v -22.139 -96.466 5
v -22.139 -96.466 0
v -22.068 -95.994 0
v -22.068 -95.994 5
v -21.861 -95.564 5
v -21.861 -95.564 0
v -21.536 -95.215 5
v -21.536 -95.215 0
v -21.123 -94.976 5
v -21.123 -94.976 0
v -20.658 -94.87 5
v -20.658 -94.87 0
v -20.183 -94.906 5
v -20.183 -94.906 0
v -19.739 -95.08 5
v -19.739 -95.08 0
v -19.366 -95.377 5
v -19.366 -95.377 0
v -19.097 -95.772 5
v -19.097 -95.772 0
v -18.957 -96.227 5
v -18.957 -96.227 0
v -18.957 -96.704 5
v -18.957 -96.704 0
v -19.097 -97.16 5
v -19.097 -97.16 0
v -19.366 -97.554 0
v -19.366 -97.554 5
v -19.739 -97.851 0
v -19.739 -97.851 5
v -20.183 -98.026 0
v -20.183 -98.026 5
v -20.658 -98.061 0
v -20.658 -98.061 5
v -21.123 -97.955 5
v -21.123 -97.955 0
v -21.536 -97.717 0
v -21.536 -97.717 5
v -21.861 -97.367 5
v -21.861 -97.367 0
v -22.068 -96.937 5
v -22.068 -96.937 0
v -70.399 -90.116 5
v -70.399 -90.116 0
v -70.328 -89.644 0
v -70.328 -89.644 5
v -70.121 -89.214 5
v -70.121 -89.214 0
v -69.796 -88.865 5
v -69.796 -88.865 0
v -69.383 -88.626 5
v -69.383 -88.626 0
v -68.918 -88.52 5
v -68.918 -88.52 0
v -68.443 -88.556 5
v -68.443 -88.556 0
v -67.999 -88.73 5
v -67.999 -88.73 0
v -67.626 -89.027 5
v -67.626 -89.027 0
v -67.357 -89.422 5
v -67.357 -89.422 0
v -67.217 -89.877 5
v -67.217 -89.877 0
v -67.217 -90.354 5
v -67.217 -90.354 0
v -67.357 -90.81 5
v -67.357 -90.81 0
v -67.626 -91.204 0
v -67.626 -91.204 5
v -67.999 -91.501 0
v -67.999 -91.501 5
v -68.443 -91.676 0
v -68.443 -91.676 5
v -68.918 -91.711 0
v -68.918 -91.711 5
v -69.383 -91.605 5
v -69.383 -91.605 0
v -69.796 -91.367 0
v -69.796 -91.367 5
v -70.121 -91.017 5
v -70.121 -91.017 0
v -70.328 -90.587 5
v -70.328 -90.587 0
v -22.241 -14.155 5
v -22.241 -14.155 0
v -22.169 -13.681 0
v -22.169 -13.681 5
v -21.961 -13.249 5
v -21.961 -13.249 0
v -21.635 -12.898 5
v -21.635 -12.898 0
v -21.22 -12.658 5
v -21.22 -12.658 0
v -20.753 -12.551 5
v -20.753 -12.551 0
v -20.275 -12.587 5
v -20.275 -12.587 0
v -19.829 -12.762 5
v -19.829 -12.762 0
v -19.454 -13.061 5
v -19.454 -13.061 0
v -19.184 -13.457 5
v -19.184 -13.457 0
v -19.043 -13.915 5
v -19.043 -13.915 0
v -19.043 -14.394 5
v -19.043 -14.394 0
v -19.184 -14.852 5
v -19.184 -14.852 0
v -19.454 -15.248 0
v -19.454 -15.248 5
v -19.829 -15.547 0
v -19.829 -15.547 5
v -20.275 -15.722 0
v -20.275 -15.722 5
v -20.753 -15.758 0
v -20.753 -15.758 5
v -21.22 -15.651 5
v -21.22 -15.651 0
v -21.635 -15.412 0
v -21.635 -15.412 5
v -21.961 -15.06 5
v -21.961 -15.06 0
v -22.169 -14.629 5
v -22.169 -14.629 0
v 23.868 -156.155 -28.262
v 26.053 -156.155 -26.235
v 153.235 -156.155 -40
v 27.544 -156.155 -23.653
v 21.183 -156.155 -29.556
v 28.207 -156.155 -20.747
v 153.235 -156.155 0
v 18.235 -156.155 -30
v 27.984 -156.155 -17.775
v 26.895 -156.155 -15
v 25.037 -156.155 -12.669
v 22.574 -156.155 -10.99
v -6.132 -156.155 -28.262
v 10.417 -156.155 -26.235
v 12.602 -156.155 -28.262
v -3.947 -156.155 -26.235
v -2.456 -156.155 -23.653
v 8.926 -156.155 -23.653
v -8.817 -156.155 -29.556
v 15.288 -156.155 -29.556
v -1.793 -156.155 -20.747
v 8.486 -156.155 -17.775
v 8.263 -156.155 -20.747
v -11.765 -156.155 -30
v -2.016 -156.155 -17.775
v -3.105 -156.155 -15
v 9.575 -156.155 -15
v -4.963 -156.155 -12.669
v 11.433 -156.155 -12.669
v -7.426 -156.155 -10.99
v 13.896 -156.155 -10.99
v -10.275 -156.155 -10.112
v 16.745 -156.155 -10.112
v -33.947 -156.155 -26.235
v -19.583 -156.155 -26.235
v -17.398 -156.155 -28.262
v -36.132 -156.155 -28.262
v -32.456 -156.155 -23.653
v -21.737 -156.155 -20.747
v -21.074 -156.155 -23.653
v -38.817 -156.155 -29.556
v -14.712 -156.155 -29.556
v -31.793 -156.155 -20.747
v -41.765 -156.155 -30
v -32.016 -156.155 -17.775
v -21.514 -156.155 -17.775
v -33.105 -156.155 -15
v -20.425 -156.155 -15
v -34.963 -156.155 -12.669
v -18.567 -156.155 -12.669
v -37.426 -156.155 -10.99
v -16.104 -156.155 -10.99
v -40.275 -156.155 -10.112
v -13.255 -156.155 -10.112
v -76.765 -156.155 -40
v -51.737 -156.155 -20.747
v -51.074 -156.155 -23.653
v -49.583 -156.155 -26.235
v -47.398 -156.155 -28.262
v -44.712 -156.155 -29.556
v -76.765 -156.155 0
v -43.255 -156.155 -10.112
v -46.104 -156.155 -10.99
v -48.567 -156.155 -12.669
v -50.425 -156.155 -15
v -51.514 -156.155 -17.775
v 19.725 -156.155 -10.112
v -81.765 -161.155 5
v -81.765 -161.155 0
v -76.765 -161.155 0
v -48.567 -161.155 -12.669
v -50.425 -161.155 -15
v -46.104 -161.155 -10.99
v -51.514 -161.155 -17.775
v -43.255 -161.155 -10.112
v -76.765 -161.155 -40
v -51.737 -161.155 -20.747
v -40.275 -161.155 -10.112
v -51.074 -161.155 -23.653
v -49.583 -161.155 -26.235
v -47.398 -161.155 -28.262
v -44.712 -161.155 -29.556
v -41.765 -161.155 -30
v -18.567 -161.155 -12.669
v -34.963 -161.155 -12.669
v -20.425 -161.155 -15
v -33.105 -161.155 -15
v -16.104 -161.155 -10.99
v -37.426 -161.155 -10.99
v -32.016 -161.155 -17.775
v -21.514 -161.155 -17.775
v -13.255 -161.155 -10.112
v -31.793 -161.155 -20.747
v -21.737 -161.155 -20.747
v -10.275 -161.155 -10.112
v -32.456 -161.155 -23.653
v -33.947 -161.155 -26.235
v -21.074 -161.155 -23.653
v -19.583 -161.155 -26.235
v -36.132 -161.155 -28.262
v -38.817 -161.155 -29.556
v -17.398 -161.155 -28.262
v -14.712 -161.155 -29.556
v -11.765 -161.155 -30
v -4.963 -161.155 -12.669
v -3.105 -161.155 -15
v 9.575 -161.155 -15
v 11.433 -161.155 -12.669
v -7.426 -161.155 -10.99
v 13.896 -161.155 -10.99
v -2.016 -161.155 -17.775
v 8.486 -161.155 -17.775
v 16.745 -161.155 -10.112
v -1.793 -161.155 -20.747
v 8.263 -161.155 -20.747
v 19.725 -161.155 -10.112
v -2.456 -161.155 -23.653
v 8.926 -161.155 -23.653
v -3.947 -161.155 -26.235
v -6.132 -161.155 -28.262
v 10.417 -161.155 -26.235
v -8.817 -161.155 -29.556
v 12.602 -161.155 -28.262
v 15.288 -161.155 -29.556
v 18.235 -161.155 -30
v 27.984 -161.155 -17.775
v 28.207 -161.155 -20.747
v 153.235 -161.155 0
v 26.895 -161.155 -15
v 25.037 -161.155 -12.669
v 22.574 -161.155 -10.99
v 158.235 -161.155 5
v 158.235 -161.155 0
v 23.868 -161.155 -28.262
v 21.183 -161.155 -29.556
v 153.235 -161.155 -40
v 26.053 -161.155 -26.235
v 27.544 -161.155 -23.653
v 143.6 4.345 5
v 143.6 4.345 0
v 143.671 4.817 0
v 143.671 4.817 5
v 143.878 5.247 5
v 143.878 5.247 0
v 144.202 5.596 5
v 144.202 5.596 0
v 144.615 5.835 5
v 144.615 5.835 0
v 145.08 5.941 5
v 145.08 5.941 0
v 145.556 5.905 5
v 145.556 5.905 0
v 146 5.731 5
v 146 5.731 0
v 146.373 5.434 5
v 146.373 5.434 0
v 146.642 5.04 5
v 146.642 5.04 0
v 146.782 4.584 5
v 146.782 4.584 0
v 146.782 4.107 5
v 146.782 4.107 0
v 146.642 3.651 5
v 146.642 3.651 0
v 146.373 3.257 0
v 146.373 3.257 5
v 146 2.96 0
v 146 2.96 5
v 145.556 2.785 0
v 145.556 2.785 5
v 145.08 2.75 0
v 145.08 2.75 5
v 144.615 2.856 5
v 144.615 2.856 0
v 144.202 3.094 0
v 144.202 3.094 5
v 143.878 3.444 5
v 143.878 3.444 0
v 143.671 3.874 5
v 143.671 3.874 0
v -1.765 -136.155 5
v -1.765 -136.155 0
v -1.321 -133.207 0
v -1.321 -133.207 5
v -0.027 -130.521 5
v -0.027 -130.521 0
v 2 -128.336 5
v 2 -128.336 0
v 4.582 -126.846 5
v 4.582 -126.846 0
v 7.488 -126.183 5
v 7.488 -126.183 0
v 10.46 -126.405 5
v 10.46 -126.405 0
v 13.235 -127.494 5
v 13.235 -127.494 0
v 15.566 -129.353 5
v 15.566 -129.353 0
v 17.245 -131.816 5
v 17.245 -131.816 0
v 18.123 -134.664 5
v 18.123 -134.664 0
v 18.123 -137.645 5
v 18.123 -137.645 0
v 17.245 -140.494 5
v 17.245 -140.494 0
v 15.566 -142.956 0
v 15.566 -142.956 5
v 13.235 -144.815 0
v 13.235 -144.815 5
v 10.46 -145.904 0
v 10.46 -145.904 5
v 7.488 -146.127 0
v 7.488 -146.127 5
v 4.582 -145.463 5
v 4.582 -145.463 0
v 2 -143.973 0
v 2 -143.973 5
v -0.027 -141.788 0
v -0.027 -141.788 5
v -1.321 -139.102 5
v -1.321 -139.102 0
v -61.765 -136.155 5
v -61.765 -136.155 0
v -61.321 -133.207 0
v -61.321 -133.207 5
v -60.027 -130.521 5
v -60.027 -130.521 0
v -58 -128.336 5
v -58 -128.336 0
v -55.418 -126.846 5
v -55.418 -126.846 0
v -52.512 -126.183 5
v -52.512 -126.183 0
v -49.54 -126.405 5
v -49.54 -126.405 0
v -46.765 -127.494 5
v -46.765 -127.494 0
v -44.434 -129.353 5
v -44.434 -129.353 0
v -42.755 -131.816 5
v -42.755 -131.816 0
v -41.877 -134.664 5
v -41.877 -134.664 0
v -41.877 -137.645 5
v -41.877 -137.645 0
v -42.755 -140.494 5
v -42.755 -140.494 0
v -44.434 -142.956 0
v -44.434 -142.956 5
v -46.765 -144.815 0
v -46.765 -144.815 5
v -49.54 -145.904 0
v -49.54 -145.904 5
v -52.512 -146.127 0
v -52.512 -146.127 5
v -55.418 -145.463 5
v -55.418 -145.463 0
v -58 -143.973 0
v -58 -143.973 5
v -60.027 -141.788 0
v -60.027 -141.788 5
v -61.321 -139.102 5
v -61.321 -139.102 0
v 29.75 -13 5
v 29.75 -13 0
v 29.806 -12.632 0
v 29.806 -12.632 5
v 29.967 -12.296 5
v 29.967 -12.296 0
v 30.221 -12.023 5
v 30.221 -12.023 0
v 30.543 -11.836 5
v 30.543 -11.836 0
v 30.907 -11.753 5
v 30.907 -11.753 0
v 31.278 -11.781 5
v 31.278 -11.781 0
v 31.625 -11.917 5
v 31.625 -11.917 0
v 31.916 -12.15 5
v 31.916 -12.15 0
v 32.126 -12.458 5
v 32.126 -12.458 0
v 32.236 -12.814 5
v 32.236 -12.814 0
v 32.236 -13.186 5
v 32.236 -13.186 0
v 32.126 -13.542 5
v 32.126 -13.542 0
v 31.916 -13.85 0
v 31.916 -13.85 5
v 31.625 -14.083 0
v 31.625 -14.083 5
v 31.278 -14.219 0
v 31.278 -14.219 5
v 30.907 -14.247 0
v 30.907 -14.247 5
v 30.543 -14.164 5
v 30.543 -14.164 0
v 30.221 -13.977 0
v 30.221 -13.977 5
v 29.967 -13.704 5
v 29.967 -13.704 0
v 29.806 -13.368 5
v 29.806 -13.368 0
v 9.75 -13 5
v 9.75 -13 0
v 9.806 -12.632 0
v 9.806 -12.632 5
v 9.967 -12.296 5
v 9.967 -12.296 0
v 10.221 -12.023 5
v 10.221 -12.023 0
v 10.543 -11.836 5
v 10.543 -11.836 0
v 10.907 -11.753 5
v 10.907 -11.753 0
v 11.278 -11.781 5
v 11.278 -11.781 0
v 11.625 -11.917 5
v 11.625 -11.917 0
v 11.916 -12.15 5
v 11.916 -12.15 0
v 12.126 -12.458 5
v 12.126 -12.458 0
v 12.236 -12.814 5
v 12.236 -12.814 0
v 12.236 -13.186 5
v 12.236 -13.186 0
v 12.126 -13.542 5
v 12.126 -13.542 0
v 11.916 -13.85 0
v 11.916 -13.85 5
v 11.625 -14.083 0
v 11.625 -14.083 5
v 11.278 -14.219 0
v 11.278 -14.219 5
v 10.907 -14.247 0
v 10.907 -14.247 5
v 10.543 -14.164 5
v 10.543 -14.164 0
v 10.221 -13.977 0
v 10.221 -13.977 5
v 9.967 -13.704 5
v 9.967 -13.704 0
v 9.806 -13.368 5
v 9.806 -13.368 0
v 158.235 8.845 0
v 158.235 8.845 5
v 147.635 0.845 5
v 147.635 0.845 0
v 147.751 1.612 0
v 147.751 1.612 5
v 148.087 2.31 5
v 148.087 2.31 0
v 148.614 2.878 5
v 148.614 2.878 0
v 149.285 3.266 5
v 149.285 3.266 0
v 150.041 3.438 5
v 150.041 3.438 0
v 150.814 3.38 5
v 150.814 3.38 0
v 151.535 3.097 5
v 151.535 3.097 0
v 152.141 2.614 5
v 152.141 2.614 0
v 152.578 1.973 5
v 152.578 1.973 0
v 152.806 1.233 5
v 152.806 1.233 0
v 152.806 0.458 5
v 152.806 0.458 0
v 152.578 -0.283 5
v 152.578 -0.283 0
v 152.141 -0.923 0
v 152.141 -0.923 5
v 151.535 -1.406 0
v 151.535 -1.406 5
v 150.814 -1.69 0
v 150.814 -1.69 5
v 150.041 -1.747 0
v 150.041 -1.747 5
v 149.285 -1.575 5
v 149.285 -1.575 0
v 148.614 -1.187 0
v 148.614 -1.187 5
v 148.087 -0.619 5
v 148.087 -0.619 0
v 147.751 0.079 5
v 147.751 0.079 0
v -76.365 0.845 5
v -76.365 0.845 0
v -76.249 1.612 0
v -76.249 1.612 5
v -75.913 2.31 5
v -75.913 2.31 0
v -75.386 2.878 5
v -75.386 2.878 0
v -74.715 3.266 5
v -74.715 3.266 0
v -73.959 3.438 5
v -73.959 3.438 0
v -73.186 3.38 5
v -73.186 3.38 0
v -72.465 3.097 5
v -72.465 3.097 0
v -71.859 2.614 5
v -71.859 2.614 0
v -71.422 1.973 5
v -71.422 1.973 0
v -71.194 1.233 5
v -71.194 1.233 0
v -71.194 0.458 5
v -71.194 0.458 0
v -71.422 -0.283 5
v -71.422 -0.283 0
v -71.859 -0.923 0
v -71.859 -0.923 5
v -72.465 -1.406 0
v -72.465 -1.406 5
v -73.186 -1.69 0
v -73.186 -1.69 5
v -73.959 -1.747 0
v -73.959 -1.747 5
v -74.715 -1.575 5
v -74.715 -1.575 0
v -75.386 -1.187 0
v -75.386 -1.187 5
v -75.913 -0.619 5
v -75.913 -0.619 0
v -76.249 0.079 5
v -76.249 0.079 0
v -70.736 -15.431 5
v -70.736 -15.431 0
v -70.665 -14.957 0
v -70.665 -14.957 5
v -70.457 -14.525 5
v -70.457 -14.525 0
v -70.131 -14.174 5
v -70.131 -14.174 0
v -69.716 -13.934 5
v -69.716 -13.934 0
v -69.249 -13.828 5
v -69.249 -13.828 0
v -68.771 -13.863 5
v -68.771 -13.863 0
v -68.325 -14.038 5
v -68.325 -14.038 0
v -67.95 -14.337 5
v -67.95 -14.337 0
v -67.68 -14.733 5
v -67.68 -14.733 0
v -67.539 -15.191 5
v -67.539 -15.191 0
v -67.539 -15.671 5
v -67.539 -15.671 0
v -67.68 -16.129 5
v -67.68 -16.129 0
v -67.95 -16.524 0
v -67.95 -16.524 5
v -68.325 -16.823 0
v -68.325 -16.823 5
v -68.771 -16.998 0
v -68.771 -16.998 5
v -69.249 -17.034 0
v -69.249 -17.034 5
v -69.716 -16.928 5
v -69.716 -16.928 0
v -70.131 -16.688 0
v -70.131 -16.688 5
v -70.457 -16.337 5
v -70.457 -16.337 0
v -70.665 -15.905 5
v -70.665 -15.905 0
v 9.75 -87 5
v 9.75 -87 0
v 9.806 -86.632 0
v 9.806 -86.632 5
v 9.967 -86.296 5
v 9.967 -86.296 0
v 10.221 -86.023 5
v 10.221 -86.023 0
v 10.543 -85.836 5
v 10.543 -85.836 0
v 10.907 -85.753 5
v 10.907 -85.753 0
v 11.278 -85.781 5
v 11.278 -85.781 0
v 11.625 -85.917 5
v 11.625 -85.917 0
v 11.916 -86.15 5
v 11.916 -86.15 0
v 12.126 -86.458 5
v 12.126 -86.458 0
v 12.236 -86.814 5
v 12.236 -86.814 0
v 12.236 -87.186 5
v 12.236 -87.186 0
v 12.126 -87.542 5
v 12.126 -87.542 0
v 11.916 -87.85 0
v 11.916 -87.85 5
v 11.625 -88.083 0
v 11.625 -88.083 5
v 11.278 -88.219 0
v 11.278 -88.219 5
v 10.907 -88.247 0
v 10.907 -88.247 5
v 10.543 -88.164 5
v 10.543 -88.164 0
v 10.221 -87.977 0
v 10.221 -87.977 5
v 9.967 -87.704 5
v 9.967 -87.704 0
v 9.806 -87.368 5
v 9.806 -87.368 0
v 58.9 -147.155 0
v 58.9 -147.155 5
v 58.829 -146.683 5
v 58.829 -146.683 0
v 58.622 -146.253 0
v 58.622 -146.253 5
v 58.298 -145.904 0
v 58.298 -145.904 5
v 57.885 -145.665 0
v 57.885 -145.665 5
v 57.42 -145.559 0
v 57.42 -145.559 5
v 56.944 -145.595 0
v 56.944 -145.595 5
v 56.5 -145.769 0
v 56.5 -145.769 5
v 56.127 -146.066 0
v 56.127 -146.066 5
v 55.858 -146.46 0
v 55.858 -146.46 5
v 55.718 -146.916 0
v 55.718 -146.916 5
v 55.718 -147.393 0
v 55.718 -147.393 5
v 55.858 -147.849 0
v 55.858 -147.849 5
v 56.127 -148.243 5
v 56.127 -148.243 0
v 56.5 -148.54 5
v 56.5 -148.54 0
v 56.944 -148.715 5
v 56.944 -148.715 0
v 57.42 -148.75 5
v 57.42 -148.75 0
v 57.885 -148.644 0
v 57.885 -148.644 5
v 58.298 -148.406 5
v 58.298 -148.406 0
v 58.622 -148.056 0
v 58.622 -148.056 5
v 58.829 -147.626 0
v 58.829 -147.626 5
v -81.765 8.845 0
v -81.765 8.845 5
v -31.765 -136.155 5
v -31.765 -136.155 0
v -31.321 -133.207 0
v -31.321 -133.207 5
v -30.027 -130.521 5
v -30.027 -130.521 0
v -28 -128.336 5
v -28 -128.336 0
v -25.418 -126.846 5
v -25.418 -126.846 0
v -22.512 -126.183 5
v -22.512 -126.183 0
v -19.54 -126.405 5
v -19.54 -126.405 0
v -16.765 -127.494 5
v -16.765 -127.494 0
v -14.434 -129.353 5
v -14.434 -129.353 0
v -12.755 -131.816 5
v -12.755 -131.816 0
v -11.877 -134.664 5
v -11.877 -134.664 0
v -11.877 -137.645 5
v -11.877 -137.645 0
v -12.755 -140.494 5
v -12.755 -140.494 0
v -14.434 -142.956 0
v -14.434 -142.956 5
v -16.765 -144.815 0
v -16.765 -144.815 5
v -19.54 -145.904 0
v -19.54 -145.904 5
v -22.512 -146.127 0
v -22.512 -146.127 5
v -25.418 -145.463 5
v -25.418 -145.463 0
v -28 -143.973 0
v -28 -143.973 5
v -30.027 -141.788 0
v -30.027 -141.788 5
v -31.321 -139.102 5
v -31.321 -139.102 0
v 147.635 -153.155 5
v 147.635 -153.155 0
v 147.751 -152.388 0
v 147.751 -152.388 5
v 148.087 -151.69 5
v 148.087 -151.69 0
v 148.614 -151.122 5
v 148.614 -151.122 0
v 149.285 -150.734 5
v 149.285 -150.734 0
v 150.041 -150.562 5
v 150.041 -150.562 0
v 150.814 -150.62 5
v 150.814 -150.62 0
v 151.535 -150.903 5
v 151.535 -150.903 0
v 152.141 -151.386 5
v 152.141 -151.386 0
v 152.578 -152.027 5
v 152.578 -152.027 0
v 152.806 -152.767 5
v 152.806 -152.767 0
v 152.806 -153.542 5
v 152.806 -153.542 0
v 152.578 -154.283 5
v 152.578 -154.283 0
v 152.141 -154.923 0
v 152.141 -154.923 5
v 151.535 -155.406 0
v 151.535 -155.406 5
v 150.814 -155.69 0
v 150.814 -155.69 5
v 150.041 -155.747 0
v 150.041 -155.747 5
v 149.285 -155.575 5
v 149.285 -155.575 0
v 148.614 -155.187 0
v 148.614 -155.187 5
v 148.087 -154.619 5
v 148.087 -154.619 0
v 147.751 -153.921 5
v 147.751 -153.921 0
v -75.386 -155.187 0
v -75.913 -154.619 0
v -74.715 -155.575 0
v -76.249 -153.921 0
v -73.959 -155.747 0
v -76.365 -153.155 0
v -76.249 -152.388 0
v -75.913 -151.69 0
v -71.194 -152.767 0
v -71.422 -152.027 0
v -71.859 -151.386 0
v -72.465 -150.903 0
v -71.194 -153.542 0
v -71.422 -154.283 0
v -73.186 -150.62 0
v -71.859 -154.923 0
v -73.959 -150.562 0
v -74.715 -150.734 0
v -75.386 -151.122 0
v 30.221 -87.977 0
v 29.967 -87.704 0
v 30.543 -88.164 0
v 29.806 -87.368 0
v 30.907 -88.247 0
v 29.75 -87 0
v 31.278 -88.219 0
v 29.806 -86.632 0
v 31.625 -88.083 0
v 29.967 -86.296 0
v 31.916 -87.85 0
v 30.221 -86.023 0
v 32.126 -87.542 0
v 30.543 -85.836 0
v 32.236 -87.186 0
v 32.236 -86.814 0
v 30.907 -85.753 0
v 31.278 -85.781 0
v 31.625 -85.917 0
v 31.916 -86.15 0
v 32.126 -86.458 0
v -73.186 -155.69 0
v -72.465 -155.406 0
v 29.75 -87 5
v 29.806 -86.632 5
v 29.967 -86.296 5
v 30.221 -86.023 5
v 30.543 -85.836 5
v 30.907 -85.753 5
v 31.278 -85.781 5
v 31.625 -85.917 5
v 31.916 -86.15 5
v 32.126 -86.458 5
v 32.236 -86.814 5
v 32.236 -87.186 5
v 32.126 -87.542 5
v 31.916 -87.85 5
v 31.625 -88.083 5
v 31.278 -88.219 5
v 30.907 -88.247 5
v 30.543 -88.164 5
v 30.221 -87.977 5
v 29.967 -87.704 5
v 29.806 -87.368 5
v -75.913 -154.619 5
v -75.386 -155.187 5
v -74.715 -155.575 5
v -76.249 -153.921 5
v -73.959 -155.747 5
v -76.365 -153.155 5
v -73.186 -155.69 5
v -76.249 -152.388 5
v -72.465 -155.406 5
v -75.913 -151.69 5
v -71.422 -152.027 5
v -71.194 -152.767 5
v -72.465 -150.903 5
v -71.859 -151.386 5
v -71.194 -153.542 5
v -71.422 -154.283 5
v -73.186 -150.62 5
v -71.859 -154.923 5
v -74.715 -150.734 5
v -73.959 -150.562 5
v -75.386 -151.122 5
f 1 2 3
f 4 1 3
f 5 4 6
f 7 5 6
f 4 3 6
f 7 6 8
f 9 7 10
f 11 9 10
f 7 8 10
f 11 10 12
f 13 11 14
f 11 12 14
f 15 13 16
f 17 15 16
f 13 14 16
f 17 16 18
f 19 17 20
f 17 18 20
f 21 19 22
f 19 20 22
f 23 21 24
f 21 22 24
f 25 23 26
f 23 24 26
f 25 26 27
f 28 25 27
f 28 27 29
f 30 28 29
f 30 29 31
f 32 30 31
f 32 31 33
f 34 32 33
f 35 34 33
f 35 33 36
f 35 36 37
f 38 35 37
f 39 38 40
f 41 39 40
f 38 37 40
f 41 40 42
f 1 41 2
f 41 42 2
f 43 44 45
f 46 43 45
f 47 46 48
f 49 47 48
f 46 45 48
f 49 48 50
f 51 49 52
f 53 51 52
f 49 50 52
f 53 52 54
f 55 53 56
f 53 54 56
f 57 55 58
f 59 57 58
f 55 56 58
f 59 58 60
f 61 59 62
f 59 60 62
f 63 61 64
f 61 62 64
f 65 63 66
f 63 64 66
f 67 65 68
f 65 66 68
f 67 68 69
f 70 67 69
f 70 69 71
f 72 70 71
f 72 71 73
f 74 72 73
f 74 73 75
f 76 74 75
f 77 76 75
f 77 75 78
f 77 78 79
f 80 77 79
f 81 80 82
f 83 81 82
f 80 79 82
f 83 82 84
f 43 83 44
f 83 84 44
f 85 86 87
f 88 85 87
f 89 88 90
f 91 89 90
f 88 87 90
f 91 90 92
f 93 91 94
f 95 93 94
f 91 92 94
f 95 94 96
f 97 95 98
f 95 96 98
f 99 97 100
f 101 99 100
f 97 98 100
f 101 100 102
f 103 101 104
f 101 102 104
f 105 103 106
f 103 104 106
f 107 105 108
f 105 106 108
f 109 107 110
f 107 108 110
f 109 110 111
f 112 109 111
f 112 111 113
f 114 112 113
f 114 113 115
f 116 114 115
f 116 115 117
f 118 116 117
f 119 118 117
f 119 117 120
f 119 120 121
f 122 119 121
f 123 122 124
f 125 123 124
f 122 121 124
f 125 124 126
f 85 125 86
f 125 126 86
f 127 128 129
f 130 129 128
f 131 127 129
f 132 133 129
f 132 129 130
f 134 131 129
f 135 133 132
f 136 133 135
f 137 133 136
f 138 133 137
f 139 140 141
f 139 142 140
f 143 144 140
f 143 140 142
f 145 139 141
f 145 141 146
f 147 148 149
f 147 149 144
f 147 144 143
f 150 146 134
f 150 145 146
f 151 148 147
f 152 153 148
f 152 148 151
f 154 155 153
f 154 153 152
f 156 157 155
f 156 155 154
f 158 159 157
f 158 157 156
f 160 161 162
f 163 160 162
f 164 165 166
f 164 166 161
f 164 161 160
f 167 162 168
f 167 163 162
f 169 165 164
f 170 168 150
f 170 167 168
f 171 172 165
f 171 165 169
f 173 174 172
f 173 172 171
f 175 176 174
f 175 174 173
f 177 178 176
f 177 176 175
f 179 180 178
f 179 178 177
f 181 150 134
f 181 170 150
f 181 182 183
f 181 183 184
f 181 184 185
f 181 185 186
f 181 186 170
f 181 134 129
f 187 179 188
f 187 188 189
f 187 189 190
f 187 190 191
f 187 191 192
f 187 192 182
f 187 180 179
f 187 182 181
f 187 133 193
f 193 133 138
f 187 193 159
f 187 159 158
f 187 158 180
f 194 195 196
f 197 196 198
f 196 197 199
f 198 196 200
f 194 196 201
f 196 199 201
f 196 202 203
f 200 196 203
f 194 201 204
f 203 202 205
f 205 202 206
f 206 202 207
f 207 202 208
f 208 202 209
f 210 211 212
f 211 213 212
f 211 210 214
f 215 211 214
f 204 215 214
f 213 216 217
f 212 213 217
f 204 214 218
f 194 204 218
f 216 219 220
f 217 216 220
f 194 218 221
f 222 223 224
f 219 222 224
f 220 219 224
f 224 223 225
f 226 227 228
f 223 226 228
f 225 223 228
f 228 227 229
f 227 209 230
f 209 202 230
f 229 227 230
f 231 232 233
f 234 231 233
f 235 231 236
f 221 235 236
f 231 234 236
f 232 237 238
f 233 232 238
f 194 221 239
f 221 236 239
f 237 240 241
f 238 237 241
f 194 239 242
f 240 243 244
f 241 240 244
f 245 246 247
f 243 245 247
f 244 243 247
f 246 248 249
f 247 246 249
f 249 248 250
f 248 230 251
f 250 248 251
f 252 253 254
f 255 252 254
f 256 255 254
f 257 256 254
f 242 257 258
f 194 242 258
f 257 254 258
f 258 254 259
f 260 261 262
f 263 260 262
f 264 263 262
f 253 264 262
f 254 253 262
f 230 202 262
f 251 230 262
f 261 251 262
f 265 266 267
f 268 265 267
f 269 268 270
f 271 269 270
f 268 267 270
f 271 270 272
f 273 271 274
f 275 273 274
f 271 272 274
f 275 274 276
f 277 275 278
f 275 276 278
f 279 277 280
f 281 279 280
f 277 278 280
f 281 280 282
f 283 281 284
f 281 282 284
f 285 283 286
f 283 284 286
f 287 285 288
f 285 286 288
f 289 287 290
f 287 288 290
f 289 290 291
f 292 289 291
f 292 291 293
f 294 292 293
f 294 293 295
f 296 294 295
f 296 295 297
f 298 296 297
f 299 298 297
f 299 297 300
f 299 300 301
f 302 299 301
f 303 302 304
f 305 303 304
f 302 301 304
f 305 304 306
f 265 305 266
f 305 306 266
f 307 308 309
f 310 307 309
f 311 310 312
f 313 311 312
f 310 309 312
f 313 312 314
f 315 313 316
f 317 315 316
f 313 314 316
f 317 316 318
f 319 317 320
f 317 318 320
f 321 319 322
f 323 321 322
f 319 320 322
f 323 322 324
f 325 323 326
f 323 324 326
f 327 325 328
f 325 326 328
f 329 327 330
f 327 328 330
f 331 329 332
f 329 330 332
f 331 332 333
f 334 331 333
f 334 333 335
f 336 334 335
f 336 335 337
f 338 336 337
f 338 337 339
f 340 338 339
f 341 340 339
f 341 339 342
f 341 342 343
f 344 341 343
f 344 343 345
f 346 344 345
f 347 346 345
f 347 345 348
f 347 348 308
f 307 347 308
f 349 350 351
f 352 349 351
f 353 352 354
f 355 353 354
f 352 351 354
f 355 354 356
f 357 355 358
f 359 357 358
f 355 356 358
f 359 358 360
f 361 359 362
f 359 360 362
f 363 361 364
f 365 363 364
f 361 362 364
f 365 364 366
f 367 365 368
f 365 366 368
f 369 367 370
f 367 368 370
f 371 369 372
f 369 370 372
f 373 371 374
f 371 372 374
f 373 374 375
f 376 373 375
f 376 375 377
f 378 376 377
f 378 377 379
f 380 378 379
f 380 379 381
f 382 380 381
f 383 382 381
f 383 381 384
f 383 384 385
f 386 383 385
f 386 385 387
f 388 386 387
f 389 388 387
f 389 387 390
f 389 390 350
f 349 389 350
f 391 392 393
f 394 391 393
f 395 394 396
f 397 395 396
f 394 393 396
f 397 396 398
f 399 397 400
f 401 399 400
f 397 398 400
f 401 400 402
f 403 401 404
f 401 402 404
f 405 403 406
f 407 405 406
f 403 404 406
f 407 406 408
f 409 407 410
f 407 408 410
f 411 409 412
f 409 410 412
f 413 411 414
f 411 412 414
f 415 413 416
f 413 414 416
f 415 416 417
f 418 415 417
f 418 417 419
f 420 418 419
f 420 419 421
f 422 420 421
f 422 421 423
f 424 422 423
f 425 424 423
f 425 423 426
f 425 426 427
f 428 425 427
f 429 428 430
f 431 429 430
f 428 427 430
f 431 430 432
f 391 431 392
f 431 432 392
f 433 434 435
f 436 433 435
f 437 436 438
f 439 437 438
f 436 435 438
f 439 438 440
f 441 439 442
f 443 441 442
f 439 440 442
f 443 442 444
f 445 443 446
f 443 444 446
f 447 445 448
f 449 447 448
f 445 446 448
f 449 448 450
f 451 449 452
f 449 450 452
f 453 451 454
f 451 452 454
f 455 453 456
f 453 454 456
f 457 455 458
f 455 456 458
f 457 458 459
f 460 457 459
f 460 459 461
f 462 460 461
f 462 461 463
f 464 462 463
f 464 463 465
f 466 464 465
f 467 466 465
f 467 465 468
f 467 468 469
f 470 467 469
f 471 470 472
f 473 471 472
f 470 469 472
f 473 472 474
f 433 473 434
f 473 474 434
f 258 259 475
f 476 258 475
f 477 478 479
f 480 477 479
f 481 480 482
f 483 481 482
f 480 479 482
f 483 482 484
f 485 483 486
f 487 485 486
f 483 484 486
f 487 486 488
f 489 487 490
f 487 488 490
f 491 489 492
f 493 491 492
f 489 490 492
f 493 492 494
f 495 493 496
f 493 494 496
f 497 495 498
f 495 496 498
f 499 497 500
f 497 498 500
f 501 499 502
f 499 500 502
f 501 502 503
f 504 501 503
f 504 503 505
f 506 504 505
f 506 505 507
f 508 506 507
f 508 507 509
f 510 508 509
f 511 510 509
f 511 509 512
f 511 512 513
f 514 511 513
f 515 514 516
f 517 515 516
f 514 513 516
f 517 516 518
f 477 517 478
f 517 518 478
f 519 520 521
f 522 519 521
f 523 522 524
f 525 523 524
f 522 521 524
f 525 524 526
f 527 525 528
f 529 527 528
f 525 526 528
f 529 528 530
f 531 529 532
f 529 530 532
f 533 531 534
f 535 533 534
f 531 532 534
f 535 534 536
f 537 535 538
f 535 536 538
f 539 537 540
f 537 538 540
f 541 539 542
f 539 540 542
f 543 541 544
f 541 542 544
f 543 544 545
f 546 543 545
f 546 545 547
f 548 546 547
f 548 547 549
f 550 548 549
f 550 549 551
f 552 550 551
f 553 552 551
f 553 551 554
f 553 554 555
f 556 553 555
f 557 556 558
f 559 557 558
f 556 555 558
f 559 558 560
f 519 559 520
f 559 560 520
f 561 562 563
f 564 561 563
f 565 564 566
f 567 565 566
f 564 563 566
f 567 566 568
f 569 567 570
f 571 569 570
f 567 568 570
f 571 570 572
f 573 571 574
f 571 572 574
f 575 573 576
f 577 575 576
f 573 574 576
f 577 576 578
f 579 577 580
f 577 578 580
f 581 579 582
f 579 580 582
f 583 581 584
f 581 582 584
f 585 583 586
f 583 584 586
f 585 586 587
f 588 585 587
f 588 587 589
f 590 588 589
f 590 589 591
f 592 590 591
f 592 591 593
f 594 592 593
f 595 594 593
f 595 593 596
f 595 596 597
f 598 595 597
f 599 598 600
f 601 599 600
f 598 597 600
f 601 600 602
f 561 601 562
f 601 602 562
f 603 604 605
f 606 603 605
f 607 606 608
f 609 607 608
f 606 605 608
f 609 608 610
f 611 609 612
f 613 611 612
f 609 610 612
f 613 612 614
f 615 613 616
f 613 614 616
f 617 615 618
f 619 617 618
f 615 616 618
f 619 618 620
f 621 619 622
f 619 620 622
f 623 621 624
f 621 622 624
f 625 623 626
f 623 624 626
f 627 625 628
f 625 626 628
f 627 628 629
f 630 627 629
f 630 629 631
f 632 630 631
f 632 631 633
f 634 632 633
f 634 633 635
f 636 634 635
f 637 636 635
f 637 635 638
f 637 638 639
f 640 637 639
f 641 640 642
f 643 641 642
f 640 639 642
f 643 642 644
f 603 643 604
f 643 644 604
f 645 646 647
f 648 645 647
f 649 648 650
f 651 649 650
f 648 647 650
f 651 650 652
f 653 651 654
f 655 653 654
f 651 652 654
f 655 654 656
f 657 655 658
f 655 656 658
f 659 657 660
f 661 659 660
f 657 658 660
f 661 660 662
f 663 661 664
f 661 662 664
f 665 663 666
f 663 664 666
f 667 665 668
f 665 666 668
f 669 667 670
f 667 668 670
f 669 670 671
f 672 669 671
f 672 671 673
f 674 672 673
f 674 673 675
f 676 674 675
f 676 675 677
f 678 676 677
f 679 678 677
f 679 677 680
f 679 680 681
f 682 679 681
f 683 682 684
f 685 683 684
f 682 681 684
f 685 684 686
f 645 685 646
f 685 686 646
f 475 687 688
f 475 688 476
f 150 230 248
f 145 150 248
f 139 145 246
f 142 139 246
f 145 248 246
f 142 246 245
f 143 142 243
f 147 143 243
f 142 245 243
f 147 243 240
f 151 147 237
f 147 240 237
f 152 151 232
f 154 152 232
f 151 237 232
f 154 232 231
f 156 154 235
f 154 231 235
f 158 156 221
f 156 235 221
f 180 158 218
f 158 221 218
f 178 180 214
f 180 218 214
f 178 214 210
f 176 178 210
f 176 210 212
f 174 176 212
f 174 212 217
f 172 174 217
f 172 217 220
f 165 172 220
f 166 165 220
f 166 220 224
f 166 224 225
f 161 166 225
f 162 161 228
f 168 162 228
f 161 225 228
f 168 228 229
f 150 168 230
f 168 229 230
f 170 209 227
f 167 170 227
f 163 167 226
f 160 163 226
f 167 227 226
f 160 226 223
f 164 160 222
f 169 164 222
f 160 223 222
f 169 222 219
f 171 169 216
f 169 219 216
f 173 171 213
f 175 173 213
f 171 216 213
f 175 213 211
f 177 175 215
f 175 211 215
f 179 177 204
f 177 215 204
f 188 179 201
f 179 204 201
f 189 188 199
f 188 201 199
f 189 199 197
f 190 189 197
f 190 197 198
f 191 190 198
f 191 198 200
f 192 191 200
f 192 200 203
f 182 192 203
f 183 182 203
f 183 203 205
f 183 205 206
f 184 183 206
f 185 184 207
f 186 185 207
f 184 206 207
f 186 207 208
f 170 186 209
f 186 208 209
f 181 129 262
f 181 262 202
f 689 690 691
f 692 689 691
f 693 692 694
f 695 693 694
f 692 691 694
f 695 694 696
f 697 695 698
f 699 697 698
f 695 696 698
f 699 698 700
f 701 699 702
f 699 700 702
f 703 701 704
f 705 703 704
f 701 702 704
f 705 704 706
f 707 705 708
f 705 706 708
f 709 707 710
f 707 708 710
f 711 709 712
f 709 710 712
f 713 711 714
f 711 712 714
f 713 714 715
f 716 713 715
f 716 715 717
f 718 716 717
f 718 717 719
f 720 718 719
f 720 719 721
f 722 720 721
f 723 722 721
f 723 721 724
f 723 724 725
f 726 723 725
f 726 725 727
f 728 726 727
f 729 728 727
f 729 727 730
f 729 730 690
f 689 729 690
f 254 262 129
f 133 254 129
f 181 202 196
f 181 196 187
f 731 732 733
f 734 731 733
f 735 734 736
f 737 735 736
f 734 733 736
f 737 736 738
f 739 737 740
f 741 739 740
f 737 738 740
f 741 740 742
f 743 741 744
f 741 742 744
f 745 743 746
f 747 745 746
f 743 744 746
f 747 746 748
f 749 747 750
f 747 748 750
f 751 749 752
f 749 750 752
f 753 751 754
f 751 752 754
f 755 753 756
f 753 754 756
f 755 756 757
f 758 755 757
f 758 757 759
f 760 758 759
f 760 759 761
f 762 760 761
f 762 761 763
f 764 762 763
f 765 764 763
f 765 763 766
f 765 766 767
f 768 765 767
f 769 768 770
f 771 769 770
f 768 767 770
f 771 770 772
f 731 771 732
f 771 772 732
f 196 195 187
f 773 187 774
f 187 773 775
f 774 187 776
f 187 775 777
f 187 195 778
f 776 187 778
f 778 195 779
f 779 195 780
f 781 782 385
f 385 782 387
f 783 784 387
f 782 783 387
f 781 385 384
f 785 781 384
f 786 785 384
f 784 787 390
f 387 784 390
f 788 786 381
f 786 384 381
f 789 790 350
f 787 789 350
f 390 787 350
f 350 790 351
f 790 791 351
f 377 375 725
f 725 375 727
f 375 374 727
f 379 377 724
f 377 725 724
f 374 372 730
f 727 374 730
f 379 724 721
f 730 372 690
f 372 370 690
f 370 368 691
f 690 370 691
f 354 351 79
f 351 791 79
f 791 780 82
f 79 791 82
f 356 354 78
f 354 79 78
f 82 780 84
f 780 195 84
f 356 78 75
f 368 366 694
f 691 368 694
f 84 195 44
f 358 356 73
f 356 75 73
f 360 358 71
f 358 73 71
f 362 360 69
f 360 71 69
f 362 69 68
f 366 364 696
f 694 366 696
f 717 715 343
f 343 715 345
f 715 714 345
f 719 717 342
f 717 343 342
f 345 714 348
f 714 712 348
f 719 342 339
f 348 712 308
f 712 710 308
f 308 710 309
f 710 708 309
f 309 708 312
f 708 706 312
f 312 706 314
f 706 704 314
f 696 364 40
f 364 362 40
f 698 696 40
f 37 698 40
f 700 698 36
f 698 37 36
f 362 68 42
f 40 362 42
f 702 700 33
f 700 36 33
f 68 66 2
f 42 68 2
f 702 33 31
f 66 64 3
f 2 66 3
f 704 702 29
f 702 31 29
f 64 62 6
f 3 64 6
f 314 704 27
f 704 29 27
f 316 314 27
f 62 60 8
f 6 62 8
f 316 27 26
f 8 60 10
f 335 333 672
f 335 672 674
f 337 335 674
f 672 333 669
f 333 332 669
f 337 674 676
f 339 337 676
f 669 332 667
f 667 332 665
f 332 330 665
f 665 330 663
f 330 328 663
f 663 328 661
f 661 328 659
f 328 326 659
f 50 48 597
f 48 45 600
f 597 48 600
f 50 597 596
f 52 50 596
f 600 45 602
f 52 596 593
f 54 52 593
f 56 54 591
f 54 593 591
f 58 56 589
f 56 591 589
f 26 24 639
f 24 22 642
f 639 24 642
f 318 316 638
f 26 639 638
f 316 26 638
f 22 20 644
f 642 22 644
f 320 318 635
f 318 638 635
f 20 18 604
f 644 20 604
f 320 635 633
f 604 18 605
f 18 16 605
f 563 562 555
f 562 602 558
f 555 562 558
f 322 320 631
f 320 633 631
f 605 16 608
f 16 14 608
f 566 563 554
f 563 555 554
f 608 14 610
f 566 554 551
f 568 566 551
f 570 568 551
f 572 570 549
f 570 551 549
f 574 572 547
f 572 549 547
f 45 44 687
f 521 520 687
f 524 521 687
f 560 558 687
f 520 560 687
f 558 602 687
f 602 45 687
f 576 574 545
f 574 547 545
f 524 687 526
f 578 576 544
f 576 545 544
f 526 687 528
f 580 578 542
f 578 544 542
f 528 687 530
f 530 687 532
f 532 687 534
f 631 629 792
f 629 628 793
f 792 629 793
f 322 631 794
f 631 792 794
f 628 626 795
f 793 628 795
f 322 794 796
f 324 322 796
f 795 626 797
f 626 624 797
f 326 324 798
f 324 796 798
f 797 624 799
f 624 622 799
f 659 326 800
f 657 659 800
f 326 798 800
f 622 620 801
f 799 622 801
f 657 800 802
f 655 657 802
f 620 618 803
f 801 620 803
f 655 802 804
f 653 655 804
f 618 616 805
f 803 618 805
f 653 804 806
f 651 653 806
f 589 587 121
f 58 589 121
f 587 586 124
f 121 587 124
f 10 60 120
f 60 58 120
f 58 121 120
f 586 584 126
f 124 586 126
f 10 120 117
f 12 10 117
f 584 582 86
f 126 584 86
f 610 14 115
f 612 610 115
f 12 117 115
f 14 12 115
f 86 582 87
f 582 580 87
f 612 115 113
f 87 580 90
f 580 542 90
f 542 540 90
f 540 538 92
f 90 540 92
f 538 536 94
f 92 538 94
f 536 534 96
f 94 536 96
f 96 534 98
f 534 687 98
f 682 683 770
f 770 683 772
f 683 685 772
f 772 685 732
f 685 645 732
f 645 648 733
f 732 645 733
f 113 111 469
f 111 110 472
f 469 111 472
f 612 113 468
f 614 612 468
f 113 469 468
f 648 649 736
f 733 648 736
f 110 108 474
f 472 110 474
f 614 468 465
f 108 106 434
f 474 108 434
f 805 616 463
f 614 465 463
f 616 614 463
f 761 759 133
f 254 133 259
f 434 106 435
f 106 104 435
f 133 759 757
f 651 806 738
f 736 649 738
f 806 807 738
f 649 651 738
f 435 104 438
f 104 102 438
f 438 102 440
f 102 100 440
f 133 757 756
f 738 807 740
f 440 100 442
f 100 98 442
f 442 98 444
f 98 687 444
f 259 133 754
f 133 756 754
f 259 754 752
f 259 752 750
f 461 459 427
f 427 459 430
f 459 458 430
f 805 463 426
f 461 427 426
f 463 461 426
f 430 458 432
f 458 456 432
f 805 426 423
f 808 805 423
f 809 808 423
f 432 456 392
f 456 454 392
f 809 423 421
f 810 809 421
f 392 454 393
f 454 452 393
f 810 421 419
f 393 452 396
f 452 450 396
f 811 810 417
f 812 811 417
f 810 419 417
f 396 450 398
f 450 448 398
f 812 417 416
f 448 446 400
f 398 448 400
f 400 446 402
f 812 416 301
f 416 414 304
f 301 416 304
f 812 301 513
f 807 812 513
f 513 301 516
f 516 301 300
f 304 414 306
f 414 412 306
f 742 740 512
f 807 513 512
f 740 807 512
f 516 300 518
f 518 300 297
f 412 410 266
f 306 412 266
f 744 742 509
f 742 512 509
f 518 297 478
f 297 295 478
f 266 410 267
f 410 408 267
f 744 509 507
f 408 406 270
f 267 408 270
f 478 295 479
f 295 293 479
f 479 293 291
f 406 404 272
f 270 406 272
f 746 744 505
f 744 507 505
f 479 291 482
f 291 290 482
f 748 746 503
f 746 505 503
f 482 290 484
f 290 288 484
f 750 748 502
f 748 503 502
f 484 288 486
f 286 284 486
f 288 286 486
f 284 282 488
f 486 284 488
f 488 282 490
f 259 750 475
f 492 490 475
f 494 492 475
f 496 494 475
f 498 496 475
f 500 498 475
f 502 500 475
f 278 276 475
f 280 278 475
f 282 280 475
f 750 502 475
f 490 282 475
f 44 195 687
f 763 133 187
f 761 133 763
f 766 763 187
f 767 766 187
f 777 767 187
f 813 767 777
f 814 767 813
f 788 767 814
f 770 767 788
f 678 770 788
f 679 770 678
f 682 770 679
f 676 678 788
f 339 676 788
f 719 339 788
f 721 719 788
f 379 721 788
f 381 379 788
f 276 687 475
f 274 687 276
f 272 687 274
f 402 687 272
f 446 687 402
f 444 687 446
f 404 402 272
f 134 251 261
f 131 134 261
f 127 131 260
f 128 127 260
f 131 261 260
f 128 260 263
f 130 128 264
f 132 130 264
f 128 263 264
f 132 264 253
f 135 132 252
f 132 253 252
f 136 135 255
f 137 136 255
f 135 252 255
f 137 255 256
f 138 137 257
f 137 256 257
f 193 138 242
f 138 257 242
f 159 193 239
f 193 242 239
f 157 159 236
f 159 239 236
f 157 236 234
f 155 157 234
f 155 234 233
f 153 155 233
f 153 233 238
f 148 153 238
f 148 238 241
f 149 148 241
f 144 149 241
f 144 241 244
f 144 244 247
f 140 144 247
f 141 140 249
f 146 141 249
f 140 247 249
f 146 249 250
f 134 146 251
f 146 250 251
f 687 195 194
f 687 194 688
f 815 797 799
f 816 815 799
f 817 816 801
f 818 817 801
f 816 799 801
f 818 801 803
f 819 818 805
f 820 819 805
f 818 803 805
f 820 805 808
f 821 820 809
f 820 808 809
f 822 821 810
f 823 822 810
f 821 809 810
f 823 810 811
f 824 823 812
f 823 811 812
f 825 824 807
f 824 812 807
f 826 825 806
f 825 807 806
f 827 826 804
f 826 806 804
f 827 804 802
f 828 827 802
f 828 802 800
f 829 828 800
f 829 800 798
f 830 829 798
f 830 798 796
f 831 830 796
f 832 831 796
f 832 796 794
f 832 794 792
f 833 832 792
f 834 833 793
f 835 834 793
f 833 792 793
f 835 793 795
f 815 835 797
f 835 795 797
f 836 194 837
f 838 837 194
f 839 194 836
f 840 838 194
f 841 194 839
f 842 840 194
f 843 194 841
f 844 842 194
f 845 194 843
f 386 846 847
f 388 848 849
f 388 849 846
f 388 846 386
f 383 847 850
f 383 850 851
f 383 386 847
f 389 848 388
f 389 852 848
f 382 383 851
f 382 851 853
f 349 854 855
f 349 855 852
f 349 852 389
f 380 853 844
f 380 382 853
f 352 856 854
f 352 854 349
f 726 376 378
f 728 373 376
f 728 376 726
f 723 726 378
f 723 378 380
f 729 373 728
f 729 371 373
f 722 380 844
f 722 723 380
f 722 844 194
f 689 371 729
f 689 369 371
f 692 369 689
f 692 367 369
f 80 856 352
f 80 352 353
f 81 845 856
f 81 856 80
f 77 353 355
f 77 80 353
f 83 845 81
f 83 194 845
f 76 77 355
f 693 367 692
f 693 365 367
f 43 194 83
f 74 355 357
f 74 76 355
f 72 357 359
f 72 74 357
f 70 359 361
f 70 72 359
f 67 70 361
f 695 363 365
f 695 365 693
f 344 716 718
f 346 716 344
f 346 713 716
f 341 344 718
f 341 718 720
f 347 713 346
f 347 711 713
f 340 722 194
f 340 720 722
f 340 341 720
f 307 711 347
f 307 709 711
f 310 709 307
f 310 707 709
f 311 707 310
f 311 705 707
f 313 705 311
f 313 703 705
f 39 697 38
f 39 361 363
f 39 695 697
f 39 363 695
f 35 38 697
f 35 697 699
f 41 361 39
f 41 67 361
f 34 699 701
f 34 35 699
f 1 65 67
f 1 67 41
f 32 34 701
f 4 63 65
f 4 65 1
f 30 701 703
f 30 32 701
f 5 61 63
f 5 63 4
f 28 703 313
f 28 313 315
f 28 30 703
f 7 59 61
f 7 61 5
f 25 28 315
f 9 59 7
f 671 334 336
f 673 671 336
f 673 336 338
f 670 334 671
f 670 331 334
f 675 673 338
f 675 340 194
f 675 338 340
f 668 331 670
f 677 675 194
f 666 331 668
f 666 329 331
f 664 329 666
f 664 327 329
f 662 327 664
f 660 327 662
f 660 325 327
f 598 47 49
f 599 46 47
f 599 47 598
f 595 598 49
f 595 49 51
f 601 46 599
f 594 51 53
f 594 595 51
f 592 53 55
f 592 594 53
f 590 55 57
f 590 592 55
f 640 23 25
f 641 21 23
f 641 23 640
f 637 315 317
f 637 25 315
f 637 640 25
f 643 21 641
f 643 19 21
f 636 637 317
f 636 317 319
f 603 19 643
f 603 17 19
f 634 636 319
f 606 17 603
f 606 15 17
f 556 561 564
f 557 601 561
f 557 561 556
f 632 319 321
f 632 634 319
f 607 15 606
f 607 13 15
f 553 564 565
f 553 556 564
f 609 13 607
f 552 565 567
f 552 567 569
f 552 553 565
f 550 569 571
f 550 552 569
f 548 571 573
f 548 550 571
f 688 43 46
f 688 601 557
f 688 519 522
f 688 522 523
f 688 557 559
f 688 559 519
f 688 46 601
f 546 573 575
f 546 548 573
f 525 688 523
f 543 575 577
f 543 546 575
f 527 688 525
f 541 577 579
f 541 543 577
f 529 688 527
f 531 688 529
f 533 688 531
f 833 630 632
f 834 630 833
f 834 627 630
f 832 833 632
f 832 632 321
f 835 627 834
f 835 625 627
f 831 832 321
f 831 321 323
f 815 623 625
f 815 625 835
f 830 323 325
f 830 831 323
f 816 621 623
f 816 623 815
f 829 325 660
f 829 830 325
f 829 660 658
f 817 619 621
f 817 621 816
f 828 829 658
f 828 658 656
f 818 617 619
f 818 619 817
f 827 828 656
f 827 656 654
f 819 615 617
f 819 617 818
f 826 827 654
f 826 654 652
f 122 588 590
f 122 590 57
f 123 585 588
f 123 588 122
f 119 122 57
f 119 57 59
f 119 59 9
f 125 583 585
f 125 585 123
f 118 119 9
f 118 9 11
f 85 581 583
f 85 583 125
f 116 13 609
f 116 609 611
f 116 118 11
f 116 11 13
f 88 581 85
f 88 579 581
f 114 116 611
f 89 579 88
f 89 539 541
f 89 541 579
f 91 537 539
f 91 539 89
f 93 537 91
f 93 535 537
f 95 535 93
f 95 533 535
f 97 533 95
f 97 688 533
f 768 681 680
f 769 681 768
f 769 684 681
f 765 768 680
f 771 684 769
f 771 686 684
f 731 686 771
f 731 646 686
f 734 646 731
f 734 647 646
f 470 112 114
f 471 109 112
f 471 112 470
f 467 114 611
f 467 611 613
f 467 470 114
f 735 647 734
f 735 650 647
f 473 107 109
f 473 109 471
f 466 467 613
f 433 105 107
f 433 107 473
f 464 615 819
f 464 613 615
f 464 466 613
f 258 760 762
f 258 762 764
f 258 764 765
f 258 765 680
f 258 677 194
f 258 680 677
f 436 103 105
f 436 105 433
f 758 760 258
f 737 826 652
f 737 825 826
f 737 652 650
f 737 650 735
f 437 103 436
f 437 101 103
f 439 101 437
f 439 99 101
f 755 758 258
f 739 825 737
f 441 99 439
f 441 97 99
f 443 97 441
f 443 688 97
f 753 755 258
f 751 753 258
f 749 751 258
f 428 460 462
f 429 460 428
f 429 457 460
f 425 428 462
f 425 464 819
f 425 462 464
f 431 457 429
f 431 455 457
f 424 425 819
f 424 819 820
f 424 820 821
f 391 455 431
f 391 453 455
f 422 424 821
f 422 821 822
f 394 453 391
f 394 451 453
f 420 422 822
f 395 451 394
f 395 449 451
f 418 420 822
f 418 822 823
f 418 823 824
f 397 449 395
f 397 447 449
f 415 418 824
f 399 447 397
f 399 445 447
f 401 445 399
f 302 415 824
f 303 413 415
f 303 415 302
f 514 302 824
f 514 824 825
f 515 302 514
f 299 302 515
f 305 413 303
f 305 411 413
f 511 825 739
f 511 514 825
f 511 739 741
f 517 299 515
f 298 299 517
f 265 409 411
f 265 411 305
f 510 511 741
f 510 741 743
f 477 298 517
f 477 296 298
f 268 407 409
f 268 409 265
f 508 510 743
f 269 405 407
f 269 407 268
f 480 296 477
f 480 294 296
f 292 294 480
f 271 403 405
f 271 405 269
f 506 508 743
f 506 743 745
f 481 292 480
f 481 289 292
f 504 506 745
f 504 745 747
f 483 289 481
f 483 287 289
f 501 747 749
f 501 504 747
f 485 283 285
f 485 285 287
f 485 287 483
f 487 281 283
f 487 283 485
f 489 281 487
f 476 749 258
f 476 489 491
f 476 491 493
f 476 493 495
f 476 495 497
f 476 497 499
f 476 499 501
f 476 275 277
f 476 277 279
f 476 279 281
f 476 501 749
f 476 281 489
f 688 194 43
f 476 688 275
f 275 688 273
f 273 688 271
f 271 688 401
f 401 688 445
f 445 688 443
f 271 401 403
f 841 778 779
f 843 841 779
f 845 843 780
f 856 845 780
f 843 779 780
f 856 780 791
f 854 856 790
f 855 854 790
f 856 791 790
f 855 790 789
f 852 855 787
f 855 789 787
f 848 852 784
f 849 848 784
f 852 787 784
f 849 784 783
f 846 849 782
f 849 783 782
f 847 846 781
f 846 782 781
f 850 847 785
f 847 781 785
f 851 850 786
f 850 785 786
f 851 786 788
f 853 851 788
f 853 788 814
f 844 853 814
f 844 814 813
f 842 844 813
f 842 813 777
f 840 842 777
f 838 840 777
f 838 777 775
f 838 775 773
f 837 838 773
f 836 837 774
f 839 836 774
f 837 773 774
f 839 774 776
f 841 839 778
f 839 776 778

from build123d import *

# Parameters (mm, degrees)
ESQUISSE1_W             = 240
ESQUISSE1_H             = 170
BOSS_EXTRU_1_DEPTH      = 5
ESQUISSE2_R             = 1.6
ESQUISSE2_R_2           = 1.5999968
ESQUISSE2_R_3           = 1.607820406
ESQUISSE2_R_4           = 1.25
ENL_V_MAT_EXTRU_1_DEPTH = 5
ESQUISSE3_R             = 1.6
ENL_V_MAT_EXTRU_2_DEPTH = 5
ESQUISSE4_R             = 2.6
ENL_V_MAT_EXTRU_3_DEPTH = 5
ESQUISSE6_W             = 230
ESQUISSE6_H             = 5
BOSS_EXTRU_2_DEPTH      = 40
ESQUISSE8_R             = 10
ENL_V_MAT_EXTRU_4_DEPTH = 5
ESQUISSE9_R             = 10
ENL_V_MAT_EXTRU_5_DEPTH = 10


with BuildPart() as part:
    # Esquisse1 → Boss.-Extru.1 (new body)
    with BuildSketch(Plane.XY):
        with Locations((38.235058845, -76.154688976)):
            Rectangle(ESQUISSE1_W, ESQUISSE1_H)
    extrude(amount=BOSS_EXTRU_1_DEPTH)

    # Esquisse2 → Enlèv. mat.-Extru.1 (cut)
    with BuildSketch(Plane(origin=(0, 0, 0), x_dir=(-1, 0, 0), z_dir=(0, 0, -1))):
        with Locations((-145.2, 4.345311024)):
            Circle(ESQUISSE2_R)
        with Locations((20.538736773, -96.465756273)):
            Circle(ESQUISSE2_R_2)
        with Locations((68.798736773, -90.115756273)):
            Circle(ESQUISSE2_R_2)
        with Locations((69.128665464, -15.430898976)):
            Circle(ESQUISSE2_R_3)
        with Locations((20.632685464, -14.154688976)):
            Circle(ESQUISSE2_R_3)
        with Locations((-31, -87)):
            Circle(ESQUISSE2_R_4)
        with Locations((-11, -87)):
            Circle(ESQUISSE2_R_4)
        with Locations((-31, -13)):
            Circle(ESQUISSE2_R_4)
        with Locations((-11, -13)):
            Circle(ESQUISSE2_R_4)
    extrude(amount=-ENL_V_MAT_EXTRU_1_DEPTH, mode=Mode.SUBTRACT)

    # Esquisse3 → Enlèv. mat.-Extru.2 (cut)
    with BuildSketch(Plane.XY.offset(5)):
        with Locations((57.3, -147.154688976)):
            Circle(ESQUISSE3_R)
    extrude(amount=-ENL_V_MAT_EXTRU_2_DEPTH, mode=Mode.SUBTRACT)

    # Esquisse4 → Enlèv. mat.-Extru.3 (cut)
    with BuildSketch(Plane(origin=(0, 0, 0), x_dir=(-1, 0, 0), z_dir=(0, 0, -1))):
        with Locations((73.764941155, -153.154688976)):
            Circle(ESQUISSE4_R)
        with Locations((-150.235058845, -153.154688976)):
            Circle(ESQUISSE4_R)
        with Locations((-150.235058845, 0.845311024)):
            Circle(ESQUISSE4_R)
        with Locations((73.764941155, 0.845311024)):
            Circle(ESQUISSE4_R)
    extrude(amount=-ENL_V_MAT_EXTRU_3_DEPTH, mode=Mode.SUBTRACT)

    # Esquisse6 → Boss.-Extru.2 (add)
    with BuildSketch(Plane(origin=(0, 0, 0), x_dir=(-1, 0, 0), z_dir=(0, 0, -1))):
        with Locations((-38.235058845, -158.654688976)):
            Rectangle(ESQUISSE6_W, ESQUISSE6_H)
    extrude(amount=BOSS_EXTRU_2_DEPTH)

    # Esquisse8 → Enlèv. mat.-Extru.4 (cut)
    with BuildSketch(Plane.XZ.offset(161.154688976)):
        with Locations(Location((-41.764941155, -20, 0), (0, 0, 270))):
            Circle(ESQUISSE8_R)
        with Locations(Location((-11.764941155, -20, 0), (0, 0, 270))):
            Circle(ESQUISSE8_R)
        with Locations(Location((18.235058845, -20, 0), (0, 0, 270))):
            Circle(ESQUISSE8_R)
    extrude(amount=-ENL_V_MAT_EXTRU_4_DEPTH, mode=Mode.SUBTRACT)

    # Esquisse9 → Enlèv. mat.-Extru.5 (cut)
    with BuildSketch(Plane(origin=(0, 0, 0), x_dir=(-1, 0, 0), z_dir=(0, 0, -1))):
        with Locations((51.764941155, -136.154688976)):
            Circle(ESQUISSE9_R)
        with Locations((21.764941155, -136.154688976)):
            Circle(ESQUISSE9_R)
        with Locations((-8.235058845, -136.154688976)):
            Circle(ESQUISSE9_R)
    extrude(amount=-ENL_V_MAT_EXTRU_5_DEPTH, mode=Mode.SUBTRACT)


solid = part.part
